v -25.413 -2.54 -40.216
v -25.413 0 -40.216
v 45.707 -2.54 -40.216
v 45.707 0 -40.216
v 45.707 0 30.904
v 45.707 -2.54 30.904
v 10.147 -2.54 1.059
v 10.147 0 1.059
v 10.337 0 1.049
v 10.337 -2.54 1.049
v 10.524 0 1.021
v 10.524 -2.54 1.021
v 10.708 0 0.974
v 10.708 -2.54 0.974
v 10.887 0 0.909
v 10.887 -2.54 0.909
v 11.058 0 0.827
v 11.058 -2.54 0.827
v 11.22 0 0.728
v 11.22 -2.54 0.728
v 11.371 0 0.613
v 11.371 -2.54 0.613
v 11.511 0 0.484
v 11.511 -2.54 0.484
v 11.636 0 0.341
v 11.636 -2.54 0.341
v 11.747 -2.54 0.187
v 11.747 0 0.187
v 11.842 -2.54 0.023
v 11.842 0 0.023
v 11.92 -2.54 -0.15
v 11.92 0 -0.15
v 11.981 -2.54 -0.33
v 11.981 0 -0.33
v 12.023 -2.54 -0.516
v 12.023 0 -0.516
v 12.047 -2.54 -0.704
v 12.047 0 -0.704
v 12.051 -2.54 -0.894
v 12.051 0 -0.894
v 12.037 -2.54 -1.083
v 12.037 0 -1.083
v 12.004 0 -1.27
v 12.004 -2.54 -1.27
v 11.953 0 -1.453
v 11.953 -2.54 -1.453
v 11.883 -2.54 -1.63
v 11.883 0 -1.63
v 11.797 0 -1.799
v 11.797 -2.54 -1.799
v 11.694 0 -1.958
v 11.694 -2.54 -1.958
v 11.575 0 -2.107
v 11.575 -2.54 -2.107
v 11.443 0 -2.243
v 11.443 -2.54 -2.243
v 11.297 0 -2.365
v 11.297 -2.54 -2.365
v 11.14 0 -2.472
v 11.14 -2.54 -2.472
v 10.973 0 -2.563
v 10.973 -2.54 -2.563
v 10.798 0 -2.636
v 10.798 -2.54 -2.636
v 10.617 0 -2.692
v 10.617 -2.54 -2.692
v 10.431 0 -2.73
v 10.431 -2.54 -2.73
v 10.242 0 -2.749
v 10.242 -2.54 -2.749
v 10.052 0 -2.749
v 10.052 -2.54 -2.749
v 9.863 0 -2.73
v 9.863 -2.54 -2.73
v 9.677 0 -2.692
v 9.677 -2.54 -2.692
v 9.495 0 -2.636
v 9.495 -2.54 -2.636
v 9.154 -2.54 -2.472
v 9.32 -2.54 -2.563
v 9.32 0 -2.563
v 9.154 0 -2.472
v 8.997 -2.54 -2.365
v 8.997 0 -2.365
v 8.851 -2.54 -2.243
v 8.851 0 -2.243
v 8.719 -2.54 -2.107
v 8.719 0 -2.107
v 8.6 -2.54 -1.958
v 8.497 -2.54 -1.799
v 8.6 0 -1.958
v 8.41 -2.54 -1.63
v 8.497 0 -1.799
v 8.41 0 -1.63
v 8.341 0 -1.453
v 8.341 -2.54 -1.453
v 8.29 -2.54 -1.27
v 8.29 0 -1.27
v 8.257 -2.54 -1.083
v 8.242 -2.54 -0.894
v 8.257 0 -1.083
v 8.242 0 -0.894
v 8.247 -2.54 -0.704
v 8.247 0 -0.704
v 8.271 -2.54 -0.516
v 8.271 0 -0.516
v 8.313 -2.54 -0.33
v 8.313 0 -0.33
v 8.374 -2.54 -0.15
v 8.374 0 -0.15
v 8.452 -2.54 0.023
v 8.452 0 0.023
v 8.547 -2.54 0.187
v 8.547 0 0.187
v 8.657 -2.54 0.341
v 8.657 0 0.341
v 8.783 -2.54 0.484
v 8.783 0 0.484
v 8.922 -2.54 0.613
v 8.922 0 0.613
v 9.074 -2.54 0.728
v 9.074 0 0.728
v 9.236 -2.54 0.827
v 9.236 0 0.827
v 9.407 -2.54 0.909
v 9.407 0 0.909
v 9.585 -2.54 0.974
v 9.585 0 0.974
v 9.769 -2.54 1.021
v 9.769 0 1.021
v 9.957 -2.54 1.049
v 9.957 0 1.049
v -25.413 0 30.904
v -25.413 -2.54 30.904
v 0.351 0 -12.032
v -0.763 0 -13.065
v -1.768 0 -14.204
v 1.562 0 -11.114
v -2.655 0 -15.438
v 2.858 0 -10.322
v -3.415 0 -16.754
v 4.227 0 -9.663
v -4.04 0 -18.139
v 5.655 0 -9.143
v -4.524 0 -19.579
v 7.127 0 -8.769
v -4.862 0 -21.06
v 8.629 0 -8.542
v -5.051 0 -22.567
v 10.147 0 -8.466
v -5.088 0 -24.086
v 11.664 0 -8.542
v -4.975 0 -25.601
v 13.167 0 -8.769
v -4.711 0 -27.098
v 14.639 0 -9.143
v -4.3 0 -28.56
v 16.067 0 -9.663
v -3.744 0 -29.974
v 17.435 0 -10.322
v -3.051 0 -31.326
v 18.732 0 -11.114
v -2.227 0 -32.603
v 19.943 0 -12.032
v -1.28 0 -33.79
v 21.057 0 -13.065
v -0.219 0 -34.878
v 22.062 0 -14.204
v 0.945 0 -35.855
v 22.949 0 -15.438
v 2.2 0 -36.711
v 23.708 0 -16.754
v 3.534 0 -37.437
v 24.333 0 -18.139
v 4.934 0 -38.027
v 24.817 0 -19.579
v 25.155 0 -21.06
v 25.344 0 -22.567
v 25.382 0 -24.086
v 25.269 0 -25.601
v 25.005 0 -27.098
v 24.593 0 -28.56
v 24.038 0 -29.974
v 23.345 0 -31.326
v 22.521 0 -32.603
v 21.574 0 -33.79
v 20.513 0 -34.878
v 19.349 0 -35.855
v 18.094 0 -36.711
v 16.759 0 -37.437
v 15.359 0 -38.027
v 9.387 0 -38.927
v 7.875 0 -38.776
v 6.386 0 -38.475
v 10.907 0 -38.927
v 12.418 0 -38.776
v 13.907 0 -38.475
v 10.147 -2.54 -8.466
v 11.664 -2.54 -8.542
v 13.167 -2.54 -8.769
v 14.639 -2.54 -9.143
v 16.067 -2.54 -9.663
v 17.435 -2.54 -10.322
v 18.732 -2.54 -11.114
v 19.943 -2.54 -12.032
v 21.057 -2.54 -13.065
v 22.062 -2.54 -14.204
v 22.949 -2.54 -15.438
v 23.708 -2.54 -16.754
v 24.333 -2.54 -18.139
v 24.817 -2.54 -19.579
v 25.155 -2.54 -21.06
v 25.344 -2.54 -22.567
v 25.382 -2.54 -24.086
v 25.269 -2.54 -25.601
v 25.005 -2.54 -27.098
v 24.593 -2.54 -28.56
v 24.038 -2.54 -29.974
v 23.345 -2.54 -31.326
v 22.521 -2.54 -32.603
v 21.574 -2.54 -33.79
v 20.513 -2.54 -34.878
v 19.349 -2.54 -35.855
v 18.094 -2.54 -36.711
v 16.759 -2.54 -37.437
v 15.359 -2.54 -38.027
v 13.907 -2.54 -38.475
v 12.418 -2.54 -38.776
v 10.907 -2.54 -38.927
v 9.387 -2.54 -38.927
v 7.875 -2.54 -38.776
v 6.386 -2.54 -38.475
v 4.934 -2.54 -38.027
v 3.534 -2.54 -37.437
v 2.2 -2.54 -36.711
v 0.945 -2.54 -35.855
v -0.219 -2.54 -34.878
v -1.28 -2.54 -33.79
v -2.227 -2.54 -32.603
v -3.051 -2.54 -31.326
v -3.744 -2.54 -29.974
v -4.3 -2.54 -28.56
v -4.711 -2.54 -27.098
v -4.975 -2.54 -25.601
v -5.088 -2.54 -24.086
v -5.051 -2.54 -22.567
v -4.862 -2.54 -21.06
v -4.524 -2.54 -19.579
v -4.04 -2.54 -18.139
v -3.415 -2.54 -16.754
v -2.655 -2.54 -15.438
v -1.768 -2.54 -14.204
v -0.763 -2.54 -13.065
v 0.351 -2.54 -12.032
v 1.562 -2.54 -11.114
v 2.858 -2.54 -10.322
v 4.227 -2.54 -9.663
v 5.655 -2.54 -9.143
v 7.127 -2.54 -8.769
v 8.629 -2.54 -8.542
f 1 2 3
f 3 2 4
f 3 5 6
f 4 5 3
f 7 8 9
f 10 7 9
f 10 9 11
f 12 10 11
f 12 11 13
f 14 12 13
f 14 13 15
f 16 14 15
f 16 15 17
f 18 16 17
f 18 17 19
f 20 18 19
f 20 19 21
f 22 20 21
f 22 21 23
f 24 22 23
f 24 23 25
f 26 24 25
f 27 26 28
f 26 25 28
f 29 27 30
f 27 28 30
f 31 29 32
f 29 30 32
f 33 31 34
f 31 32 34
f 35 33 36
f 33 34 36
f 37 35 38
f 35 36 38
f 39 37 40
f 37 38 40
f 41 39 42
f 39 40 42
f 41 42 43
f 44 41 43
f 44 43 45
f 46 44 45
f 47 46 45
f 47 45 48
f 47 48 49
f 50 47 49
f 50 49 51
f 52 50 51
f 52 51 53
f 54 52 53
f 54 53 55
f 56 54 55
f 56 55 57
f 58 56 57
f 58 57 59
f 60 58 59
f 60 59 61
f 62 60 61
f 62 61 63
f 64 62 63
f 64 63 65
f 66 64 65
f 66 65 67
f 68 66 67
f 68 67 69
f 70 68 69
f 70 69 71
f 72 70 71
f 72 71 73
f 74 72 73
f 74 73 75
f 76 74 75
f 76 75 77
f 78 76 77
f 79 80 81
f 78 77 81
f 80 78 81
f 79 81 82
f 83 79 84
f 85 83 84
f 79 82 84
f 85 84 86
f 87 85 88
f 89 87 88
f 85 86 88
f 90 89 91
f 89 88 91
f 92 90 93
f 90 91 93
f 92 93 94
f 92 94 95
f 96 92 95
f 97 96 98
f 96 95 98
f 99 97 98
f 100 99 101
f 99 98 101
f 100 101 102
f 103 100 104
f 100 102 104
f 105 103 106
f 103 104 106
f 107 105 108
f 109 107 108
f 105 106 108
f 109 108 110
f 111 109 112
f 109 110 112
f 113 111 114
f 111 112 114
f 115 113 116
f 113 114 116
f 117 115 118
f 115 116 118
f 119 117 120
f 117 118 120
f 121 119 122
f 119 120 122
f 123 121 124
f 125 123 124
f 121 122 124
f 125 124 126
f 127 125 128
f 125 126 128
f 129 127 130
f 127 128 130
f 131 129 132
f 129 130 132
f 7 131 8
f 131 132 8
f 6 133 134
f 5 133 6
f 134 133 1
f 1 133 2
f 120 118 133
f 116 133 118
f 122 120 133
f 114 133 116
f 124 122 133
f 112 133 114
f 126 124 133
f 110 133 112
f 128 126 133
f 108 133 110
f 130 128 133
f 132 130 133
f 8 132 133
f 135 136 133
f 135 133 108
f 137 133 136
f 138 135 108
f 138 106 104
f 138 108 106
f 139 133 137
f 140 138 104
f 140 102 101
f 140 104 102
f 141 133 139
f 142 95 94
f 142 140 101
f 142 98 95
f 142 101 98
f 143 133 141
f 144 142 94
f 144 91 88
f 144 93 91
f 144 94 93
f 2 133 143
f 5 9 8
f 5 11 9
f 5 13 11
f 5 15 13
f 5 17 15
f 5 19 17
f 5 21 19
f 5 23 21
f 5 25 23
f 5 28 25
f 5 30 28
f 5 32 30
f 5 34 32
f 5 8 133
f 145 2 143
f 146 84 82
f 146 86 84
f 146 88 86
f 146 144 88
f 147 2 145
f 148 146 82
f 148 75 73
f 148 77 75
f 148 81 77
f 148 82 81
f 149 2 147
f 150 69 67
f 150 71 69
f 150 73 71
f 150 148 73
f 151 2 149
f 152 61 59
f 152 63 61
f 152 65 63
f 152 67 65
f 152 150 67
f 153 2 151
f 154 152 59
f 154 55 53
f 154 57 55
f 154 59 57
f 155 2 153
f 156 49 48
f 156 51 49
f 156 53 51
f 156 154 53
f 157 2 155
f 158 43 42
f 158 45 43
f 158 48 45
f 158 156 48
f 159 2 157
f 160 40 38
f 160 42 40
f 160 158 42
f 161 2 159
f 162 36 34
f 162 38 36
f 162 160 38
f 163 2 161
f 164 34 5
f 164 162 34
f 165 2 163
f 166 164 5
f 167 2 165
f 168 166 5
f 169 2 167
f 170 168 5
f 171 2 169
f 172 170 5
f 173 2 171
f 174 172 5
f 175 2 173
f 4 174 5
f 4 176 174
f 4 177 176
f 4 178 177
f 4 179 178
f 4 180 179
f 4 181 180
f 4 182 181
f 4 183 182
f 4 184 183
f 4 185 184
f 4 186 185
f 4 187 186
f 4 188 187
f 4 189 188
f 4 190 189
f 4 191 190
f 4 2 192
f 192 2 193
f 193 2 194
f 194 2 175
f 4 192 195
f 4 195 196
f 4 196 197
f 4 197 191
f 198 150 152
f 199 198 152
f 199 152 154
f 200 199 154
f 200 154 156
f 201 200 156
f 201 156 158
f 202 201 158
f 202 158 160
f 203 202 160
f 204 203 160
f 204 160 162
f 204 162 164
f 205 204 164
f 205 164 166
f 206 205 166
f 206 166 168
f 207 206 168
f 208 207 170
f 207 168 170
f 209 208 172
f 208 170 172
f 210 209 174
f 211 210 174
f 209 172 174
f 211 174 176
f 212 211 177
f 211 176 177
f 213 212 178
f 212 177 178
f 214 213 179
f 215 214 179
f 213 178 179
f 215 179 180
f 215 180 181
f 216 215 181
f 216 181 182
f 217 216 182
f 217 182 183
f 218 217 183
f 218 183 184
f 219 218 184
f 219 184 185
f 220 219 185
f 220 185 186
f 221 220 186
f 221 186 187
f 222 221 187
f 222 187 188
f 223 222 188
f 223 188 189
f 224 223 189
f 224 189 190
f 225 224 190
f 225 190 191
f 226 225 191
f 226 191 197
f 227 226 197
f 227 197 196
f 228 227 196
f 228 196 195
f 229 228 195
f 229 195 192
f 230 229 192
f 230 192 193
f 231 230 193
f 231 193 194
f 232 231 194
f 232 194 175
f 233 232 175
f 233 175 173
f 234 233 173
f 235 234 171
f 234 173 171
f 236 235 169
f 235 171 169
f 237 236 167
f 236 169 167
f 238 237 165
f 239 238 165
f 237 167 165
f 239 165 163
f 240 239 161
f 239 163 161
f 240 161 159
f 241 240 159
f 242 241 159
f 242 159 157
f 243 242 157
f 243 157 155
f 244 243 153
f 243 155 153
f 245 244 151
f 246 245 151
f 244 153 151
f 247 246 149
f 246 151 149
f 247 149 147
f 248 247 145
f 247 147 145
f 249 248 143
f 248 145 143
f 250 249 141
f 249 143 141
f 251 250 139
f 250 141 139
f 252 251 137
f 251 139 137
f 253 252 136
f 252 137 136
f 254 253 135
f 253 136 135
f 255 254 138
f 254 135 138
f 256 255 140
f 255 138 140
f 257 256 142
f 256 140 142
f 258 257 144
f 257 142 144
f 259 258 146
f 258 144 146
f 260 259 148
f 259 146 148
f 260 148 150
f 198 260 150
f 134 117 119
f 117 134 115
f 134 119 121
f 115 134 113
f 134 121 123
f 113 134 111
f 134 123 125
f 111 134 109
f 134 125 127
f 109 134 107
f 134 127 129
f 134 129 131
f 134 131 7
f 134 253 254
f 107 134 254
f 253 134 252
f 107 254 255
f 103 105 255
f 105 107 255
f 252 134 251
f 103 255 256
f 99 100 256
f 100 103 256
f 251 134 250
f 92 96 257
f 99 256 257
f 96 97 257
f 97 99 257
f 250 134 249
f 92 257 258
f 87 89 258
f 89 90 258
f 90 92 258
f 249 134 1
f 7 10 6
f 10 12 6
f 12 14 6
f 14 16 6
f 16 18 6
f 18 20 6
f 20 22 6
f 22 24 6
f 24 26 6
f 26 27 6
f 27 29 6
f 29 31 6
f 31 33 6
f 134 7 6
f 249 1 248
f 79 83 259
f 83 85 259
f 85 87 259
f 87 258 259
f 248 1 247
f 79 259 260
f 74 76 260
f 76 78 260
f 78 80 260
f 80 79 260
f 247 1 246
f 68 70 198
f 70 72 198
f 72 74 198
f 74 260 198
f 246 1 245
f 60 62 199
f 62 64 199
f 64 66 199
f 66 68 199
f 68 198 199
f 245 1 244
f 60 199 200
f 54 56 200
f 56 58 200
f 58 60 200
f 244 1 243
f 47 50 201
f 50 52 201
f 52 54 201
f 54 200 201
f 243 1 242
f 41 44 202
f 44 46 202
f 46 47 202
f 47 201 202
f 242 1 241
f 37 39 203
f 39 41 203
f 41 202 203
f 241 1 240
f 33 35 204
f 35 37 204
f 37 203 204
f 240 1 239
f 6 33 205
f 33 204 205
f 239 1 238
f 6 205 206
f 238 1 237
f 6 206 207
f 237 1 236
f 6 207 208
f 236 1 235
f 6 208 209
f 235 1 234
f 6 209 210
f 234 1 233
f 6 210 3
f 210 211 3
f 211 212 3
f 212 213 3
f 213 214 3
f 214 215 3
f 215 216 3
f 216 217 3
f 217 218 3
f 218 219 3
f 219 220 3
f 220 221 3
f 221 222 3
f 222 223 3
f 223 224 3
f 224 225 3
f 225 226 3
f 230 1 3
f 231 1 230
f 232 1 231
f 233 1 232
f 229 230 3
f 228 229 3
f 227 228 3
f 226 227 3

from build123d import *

# Parameters (mm, degrees)
SKETCH1_W           = 71.12
SKETCH1_H           = 71.12
BOSS_EXTRUDE1_DEPTH = 2.54
SKETCH2_R           = 15.24
CUT_EXTRUDE1_DEPTH  = 15.748
SKETCH4_R           = 1.905
CUT_EXTRUDE2_DEPTH  = 15.748


with BuildPart() as part:
    # Sketch1 → Boss-Extrude1 (new body)
    with BuildSketch(Plane(origin=(0, 0, 0), x_dir=(1, 0, 0), z_dir=(0, 1, 0))):
        with Locations((10.146850495, 4.656355231)):
            Rectangle(SKETCH1_W, SKETCH1_H)
    extrude(amount=-BOSS_EXTRUDE1_DEPTH)

    # Sketch2 → Cut-Extrude1 (cut)
    with BuildSketch(Plane(origin=(0, 0, 0), x_dir=(1, 0, 0), z_dir=(0, 1, 0))):
        with Locations(Location((10.146850495, 23.706355231, 0), (0, 0, 270))):
            Circle(SKETCH2_R)
    extrude(amount=-CUT_EXTRUDE1_DEPTH, mode=Mode.SUBTRACT)

    # Sketch4 → Cut-Extrude2 (cut)
    with BuildSketch(Plane(origin=(0, 0, 0), x_dir=(1, 0, 0), z_dir=(0, 1, 0))):
        with Locations(Location((10.146850495, 0.846355231, 0), (0, 0, 270))):
            Circle(SKETCH4_R)
    extrude(amount=-CUT_EXTRUDE2_DEPTH, mode=Mode.SUBTRACT)


solid = part.part
